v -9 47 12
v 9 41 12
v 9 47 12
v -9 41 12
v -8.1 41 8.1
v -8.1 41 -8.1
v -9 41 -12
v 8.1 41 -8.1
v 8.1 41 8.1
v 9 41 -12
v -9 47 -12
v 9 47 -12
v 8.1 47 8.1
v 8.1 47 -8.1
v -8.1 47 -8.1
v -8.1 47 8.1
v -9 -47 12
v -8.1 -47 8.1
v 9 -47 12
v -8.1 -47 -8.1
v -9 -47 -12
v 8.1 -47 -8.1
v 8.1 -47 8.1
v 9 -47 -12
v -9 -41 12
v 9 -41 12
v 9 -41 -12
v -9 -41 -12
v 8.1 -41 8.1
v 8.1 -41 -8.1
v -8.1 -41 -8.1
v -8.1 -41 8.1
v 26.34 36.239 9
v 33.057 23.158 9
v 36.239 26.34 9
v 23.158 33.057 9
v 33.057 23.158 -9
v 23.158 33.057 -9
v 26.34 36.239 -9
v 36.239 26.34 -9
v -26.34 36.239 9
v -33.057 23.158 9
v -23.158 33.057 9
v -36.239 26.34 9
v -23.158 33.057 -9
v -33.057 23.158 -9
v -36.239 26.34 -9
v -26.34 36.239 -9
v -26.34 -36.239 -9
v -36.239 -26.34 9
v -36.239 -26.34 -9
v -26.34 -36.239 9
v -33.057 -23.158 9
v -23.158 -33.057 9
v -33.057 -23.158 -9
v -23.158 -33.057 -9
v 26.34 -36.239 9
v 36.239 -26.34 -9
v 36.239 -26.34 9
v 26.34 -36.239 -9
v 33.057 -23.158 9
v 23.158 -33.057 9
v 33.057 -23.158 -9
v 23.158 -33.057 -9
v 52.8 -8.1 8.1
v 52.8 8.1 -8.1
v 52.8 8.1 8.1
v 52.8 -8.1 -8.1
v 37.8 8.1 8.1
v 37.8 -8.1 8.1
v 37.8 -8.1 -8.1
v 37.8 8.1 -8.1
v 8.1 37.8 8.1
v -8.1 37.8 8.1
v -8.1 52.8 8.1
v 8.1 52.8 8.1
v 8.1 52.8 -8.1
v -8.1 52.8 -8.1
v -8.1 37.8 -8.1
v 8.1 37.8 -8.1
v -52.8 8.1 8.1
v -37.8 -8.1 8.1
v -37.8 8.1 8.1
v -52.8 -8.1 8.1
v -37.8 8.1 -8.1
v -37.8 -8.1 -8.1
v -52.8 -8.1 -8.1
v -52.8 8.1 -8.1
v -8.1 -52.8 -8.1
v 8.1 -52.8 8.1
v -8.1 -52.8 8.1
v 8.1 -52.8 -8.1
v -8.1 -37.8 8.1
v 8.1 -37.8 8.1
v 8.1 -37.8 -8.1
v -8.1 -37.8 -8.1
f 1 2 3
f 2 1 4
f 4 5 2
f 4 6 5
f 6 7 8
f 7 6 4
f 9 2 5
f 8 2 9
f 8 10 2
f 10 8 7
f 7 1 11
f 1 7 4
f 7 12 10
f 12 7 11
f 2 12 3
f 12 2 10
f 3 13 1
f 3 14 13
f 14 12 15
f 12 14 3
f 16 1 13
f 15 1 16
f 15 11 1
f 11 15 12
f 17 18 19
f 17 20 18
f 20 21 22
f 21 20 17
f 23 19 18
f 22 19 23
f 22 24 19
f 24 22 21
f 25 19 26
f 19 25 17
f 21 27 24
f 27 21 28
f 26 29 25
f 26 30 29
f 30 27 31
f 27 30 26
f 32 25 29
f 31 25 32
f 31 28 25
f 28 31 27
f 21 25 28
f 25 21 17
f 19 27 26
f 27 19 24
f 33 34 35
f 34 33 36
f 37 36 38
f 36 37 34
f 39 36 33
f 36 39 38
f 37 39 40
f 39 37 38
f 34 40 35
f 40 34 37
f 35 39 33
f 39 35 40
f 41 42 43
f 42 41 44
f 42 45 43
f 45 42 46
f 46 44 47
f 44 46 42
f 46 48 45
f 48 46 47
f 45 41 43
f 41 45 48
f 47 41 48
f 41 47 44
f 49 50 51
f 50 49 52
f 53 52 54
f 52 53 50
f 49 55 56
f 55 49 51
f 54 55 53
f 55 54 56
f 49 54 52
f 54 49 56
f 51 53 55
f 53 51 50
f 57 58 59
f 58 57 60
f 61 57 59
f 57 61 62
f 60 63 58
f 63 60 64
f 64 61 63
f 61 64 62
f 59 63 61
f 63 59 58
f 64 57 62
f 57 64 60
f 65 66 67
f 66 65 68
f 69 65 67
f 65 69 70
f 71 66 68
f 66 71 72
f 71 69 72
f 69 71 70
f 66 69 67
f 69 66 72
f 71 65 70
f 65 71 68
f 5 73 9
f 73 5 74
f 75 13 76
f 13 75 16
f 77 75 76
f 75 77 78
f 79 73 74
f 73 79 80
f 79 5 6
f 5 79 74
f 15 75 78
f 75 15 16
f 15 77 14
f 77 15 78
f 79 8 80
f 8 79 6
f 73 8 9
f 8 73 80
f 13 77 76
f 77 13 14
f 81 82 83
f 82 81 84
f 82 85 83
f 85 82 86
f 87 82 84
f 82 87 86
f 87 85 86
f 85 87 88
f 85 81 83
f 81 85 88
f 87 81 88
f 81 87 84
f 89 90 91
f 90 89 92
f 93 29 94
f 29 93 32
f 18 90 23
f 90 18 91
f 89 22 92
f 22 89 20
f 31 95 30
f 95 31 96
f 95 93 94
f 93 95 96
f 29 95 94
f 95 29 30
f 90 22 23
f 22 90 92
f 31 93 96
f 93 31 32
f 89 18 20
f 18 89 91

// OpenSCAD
// file: 55_stage1_print_parameters.scad
/* BUDDY FILE 55 - STAGE 1 PRINT / INTERFACE PARAMETERS
All dimensions mm. Values marked PROCESS are starting points for calibration coupons. */
B1_OD=115; B1_CAVITY_D=111; B1_AIRWAY_D=70; B1_DUCT_OD=74;
B1_SHELL_R=B1_OD/2; B1_CAVITY_R=B1_CAVITY_D/2;
B1_WALL=2.0; B1_MIN_RIB=2.2; B1_MIN_WEB=1.2;
B1_FDM_SLIDE=0.30;       // PROCESS: per side, calibrate
B1_FDM_PRESS=0.10;       // PROCESS: per side, calibrate
B1_INSERT_OD=3.2;        // PLACEHOLDER for M2-class heat-set insert; replace from selected insert drawing
B1_M2_CLEAR=2.4;         // PROCESS starting clearance
B1_M2_HEAD=4.3;          // PLACEHOLDER head pocket
B1_M2_HEAD_H=1.8;
B1_POLAR_OPENING_D=74.8;
B1_CAMERA_DUCT_GAP=0.8; B1_CAMERA_SHELL_MARGIN=1.0;
B1_ROTOR_NOMINAL_R=34.6; B1_ROTOR_STATIC_RADIAL_GAP=B1_AIRWAY_D/2-B1_ROTOR_NOMINAL_R;
assert(B1_OD==115); assert(B1_CAVITY_D==111); assert(B1_AIRWAY_D==70);
assert(B1_POLAR_OPENING_D>B1_DUCT_OD);
assert(B1_ROTOR_STATIC_RADIAL_GAP>0);
echo("FILE55 Stage1 architecture OD/cavity/airway =",B1_OD,B1_CAVITY_D,B1_AIRWAY_D);
echo("PROCESS tolerances require calibration before production prints");
// main file
/* BUDDY FILE70 - MASS DUMMY SYSTEM
Printable/visual ballast envelopes for inert Stage1 CoG and fit checks. Replace dimensions/masses with selected hardware. */
include <55_stage1_print_parameters.scad>
$fn=64;
module mass_block(size=[10,10,10],label="dummy"){cube(size,center=true);}
module stage1_mass_dummies(){
 for(a=[90,270])rotate([0,0,a])translate([44,0,0])mass_block([6,18,24],"battery");
 for(a=[45,135,225,315])rotate([0,0,a])translate([42,0,0])mass_block([4.5,14,18],"electronics");
 for(a=[0:90:270])rotate([0,0,a])translate([45.3,0,0])mass_block([15,16.2,16.2],"camera");
 for(z=[-6,6])translate([0,0,z])%cylinder(h=10,d=20,center=true);
}
stage1_mass_dummies();
echo("FILE70 inert mass-dummy envelopes for fit/CoG article; actual ballast mass must be measured");
